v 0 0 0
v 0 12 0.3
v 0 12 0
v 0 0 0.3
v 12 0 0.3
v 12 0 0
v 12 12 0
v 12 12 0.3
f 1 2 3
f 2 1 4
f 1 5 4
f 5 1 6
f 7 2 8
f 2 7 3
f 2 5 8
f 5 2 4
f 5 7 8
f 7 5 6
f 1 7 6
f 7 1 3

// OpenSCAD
// Color layer combination sample
// Base: solid white layer (z = 0..0.1)
// Layer 1 (bottom): one of 4 colors per column (z = 0.1..0.2)
// Layer 2 (top):    one of 4 colors per row    (z = 0.2..0.3)
// 4x4 grid -> 16 ordered combinations of (bottom, top) colors.
//
// Multi-color FDM workflow:
//   Set render_color to 0/1/2/3 and export an STL per color, then load
//   them as parts in your slicer. Use -1 for a coloured preview in OpenSCAD.

layer_h = 0.1;
cell    = 3;     // rectangle side length in mm
n       = 4;     // number of colors

// Color indices: 0 = white, 1 = red, 2 = blue, 3 = purple
color_rgb = [
    [1.00, 1.00, 1.00],   // white
    [0.85, 0.10, 0.10],   // red
    [0.10, 0.20, 0.85],   // blue
    [0.50, 0.10, 0.60],   // purple
];

// -1 = preview all colors; 0..3 = isolate a single color for STL export.
render_color = -1;

// Geometry belonging to color c:
//   - if c == 0 (white): the full base slab
//   - bottom-layer rectangles in column c (bottom color == c, every top color)
//   - top-layer rectangles in row c (top color == c, every bottom color)
module color_part(c) {
    if (c == 0) {
        cube([n * cell, n * cell, layer_h]);
    }
    for (row = [0 : n - 1]) {
        translate([c * cell, row * cell, layer_h])
            cube([cell, cell, layer_h]);
    }
    for (col = [0 : n - 1]) {
        translate([col * cell, c * cell, 2 * layer_h])
            cube([cell, cell, layer_h]);
    }
}

if (render_color == -1) {
    for (c = [0 : n - 1]) {
        color(color_rgb[c]) color_part(c);
    }
} else {
    color_part(render_color);
}
